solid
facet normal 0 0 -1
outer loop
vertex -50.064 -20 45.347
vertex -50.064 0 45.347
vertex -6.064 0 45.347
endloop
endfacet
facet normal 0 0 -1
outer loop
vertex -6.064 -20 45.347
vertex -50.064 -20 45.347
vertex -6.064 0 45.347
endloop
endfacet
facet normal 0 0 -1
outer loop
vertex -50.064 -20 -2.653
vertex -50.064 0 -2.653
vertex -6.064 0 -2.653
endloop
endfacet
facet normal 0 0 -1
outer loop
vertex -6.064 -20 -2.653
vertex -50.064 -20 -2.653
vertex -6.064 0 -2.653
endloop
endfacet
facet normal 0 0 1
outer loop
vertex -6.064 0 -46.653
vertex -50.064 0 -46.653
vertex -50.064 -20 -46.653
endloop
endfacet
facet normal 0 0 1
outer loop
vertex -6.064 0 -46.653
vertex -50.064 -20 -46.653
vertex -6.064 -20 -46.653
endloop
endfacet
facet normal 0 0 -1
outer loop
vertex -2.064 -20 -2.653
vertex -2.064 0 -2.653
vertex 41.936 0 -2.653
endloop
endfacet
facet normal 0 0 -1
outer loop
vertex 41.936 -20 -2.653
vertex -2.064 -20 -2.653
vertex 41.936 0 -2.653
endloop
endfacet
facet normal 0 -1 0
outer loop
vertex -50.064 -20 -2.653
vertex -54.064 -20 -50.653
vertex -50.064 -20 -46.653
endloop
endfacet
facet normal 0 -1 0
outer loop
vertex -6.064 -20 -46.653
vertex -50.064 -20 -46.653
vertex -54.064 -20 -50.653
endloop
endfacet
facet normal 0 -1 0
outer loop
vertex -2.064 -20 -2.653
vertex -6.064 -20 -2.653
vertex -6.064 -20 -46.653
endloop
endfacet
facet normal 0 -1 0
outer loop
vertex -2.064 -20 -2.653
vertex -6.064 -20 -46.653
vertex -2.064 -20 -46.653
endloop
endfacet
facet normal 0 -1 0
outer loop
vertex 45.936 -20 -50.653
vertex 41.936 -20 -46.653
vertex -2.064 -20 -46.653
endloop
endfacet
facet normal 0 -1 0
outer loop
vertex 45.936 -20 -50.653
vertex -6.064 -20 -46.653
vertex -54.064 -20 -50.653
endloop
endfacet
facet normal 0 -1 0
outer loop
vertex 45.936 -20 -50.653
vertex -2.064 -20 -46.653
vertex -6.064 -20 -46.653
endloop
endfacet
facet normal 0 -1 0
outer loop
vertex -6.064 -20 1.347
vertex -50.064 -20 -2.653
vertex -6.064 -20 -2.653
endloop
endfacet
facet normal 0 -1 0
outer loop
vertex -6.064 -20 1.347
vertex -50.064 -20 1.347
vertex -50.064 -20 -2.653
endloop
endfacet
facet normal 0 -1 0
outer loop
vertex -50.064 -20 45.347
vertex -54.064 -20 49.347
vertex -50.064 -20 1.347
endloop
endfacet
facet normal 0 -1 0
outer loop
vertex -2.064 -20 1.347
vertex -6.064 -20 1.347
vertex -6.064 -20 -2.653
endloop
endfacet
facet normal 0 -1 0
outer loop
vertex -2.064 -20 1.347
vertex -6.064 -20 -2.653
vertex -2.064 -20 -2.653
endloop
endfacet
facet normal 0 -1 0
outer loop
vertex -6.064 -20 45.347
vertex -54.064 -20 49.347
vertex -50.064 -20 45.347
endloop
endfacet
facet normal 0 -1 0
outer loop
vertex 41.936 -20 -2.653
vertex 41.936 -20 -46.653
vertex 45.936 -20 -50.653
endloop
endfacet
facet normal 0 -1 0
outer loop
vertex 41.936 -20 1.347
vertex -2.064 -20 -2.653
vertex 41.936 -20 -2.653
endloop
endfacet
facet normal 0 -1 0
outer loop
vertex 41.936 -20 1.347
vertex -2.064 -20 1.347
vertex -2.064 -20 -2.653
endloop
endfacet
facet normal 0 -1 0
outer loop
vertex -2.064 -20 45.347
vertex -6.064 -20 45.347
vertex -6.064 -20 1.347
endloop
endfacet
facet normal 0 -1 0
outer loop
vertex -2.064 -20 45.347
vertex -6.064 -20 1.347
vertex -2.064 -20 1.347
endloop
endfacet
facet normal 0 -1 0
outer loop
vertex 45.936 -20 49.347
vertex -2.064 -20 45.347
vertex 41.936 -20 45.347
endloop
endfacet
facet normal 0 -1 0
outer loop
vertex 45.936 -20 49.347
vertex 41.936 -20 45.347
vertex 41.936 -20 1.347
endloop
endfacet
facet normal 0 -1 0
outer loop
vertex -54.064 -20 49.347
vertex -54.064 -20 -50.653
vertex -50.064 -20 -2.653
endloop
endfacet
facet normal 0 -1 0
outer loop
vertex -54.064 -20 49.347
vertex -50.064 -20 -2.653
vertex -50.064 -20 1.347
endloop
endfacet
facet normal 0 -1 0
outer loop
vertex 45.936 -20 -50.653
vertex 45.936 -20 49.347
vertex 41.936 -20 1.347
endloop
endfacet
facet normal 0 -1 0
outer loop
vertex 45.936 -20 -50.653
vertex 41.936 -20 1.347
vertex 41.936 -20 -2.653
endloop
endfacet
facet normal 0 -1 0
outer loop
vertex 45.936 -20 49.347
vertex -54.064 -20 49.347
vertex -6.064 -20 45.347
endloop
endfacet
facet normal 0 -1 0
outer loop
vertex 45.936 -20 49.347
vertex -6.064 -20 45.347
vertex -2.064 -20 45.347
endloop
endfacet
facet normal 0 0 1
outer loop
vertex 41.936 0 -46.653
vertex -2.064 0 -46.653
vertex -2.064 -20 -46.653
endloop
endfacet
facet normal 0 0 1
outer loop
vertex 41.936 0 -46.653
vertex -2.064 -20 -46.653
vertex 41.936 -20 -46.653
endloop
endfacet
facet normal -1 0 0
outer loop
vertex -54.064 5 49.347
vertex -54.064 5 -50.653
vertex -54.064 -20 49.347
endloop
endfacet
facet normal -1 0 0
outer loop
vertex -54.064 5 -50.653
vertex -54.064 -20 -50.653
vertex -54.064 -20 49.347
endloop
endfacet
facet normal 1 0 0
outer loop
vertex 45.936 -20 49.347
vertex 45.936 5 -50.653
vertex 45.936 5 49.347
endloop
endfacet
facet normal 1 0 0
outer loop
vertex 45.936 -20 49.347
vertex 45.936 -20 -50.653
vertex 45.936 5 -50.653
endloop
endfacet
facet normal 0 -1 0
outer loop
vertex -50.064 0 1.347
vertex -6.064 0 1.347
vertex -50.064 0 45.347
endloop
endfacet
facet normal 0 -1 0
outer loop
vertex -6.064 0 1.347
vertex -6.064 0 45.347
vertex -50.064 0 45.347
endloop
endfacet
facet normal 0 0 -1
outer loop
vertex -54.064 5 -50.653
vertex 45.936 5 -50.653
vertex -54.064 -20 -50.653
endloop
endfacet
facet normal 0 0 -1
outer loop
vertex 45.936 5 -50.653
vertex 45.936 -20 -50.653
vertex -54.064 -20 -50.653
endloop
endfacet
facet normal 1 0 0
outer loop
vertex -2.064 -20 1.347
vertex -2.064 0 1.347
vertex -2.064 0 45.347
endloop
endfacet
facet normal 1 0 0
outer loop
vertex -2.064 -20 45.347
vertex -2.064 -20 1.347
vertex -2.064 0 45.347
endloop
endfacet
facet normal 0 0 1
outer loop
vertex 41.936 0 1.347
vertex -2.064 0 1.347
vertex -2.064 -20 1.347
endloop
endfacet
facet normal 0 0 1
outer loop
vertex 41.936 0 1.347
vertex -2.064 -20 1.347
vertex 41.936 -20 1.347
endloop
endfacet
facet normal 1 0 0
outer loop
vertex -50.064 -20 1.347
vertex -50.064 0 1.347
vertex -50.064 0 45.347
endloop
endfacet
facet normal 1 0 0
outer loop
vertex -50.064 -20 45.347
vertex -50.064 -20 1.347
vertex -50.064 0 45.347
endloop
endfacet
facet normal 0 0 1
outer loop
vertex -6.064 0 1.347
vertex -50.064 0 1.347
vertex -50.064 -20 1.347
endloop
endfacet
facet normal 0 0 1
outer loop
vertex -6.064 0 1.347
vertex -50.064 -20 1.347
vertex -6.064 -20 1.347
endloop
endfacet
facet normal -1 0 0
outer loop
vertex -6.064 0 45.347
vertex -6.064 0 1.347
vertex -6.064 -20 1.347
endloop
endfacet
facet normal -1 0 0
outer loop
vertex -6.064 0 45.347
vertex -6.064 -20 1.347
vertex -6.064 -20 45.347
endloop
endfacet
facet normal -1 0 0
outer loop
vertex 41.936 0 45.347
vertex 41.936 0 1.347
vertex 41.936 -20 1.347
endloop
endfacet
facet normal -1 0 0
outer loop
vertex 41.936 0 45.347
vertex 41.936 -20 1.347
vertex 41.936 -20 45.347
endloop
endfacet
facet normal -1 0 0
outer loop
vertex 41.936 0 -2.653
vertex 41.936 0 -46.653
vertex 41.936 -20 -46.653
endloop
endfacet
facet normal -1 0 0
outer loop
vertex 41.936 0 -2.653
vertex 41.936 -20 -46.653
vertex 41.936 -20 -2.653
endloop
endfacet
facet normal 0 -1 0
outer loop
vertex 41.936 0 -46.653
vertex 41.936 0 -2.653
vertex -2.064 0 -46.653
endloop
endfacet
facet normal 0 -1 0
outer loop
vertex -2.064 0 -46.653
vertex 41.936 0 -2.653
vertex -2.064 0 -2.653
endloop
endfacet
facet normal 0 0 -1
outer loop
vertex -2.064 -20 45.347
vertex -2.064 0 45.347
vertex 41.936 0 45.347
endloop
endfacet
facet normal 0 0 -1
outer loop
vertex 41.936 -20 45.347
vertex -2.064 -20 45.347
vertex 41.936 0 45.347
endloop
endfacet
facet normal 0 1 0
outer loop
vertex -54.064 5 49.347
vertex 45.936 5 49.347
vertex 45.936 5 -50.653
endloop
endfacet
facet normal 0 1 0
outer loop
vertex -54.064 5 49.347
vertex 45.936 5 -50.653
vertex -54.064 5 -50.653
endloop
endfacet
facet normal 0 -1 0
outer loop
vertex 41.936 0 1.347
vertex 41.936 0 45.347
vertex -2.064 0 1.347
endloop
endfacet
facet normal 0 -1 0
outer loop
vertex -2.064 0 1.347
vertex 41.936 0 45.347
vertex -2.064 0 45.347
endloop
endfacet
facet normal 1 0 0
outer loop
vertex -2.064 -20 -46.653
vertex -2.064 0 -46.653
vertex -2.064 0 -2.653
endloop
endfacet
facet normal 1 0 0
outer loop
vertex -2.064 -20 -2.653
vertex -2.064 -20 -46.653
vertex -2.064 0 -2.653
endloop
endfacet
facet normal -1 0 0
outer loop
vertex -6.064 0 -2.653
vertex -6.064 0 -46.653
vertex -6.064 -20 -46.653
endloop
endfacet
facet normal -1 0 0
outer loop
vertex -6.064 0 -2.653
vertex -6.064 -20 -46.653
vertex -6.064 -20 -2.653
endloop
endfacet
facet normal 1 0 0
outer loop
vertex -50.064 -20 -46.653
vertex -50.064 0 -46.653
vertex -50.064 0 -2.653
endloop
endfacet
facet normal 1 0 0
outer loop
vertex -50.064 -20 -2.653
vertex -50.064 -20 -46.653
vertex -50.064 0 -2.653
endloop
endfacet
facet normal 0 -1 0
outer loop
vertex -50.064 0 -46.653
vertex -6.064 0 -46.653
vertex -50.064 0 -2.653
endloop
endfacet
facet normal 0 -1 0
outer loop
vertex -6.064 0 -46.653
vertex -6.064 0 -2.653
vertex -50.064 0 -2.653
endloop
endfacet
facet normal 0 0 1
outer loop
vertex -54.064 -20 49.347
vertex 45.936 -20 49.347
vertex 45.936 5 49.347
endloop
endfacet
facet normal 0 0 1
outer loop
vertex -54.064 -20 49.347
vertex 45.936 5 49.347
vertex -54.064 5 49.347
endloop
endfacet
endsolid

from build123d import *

# Parameters (mm, degrees)
F0_W     = 100
F0_H     = 100
F0_W_2   = 44
F0_H_2   = 44
F1_DEPTH = 20
F2_W     = 100
F2_H     = 100
F3_DEPTH = 5


with BuildPart() as f1:
    # F0 (on Front) → F1 (new body)
    with BuildSketch(Plane.XZ):
        with Locations((-4.064368, -0.652734)):
            Rectangle(F0_W, F0_H)
        with Locations((-28.064368, -24.652734)):
            Rectangle(F0_W_2, F0_H_2, mode=Mode.SUBTRACT)
        with Locations((19.935632, -24.652734)):
            Rectangle(F0_W_2, F0_H_2, mode=Mode.SUBTRACT)
        with Locations((-28.064368, 23.347266)):
            Rectangle(F0_W_2, F0_H_2, mode=Mode.SUBTRACT)
        with Locations((19.935632, 23.347266)):
            Rectangle(F0_W_2, F0_H_2, mode=Mode.SUBTRACT)
    extrude(amount=F1_DEPTH)

    # F2 (on face) → F3 (join)
    with BuildSketch(Plane(origin=(0, 0, 0), x_dir=(-1, 0, 0), z_dir=(0, 1, 0))):
        with Locations((4.064368, -0.652734)):
            Rectangle(F2_W, F2_H)
    extrude(amount=F3_DEPTH)


solid = f1.part
